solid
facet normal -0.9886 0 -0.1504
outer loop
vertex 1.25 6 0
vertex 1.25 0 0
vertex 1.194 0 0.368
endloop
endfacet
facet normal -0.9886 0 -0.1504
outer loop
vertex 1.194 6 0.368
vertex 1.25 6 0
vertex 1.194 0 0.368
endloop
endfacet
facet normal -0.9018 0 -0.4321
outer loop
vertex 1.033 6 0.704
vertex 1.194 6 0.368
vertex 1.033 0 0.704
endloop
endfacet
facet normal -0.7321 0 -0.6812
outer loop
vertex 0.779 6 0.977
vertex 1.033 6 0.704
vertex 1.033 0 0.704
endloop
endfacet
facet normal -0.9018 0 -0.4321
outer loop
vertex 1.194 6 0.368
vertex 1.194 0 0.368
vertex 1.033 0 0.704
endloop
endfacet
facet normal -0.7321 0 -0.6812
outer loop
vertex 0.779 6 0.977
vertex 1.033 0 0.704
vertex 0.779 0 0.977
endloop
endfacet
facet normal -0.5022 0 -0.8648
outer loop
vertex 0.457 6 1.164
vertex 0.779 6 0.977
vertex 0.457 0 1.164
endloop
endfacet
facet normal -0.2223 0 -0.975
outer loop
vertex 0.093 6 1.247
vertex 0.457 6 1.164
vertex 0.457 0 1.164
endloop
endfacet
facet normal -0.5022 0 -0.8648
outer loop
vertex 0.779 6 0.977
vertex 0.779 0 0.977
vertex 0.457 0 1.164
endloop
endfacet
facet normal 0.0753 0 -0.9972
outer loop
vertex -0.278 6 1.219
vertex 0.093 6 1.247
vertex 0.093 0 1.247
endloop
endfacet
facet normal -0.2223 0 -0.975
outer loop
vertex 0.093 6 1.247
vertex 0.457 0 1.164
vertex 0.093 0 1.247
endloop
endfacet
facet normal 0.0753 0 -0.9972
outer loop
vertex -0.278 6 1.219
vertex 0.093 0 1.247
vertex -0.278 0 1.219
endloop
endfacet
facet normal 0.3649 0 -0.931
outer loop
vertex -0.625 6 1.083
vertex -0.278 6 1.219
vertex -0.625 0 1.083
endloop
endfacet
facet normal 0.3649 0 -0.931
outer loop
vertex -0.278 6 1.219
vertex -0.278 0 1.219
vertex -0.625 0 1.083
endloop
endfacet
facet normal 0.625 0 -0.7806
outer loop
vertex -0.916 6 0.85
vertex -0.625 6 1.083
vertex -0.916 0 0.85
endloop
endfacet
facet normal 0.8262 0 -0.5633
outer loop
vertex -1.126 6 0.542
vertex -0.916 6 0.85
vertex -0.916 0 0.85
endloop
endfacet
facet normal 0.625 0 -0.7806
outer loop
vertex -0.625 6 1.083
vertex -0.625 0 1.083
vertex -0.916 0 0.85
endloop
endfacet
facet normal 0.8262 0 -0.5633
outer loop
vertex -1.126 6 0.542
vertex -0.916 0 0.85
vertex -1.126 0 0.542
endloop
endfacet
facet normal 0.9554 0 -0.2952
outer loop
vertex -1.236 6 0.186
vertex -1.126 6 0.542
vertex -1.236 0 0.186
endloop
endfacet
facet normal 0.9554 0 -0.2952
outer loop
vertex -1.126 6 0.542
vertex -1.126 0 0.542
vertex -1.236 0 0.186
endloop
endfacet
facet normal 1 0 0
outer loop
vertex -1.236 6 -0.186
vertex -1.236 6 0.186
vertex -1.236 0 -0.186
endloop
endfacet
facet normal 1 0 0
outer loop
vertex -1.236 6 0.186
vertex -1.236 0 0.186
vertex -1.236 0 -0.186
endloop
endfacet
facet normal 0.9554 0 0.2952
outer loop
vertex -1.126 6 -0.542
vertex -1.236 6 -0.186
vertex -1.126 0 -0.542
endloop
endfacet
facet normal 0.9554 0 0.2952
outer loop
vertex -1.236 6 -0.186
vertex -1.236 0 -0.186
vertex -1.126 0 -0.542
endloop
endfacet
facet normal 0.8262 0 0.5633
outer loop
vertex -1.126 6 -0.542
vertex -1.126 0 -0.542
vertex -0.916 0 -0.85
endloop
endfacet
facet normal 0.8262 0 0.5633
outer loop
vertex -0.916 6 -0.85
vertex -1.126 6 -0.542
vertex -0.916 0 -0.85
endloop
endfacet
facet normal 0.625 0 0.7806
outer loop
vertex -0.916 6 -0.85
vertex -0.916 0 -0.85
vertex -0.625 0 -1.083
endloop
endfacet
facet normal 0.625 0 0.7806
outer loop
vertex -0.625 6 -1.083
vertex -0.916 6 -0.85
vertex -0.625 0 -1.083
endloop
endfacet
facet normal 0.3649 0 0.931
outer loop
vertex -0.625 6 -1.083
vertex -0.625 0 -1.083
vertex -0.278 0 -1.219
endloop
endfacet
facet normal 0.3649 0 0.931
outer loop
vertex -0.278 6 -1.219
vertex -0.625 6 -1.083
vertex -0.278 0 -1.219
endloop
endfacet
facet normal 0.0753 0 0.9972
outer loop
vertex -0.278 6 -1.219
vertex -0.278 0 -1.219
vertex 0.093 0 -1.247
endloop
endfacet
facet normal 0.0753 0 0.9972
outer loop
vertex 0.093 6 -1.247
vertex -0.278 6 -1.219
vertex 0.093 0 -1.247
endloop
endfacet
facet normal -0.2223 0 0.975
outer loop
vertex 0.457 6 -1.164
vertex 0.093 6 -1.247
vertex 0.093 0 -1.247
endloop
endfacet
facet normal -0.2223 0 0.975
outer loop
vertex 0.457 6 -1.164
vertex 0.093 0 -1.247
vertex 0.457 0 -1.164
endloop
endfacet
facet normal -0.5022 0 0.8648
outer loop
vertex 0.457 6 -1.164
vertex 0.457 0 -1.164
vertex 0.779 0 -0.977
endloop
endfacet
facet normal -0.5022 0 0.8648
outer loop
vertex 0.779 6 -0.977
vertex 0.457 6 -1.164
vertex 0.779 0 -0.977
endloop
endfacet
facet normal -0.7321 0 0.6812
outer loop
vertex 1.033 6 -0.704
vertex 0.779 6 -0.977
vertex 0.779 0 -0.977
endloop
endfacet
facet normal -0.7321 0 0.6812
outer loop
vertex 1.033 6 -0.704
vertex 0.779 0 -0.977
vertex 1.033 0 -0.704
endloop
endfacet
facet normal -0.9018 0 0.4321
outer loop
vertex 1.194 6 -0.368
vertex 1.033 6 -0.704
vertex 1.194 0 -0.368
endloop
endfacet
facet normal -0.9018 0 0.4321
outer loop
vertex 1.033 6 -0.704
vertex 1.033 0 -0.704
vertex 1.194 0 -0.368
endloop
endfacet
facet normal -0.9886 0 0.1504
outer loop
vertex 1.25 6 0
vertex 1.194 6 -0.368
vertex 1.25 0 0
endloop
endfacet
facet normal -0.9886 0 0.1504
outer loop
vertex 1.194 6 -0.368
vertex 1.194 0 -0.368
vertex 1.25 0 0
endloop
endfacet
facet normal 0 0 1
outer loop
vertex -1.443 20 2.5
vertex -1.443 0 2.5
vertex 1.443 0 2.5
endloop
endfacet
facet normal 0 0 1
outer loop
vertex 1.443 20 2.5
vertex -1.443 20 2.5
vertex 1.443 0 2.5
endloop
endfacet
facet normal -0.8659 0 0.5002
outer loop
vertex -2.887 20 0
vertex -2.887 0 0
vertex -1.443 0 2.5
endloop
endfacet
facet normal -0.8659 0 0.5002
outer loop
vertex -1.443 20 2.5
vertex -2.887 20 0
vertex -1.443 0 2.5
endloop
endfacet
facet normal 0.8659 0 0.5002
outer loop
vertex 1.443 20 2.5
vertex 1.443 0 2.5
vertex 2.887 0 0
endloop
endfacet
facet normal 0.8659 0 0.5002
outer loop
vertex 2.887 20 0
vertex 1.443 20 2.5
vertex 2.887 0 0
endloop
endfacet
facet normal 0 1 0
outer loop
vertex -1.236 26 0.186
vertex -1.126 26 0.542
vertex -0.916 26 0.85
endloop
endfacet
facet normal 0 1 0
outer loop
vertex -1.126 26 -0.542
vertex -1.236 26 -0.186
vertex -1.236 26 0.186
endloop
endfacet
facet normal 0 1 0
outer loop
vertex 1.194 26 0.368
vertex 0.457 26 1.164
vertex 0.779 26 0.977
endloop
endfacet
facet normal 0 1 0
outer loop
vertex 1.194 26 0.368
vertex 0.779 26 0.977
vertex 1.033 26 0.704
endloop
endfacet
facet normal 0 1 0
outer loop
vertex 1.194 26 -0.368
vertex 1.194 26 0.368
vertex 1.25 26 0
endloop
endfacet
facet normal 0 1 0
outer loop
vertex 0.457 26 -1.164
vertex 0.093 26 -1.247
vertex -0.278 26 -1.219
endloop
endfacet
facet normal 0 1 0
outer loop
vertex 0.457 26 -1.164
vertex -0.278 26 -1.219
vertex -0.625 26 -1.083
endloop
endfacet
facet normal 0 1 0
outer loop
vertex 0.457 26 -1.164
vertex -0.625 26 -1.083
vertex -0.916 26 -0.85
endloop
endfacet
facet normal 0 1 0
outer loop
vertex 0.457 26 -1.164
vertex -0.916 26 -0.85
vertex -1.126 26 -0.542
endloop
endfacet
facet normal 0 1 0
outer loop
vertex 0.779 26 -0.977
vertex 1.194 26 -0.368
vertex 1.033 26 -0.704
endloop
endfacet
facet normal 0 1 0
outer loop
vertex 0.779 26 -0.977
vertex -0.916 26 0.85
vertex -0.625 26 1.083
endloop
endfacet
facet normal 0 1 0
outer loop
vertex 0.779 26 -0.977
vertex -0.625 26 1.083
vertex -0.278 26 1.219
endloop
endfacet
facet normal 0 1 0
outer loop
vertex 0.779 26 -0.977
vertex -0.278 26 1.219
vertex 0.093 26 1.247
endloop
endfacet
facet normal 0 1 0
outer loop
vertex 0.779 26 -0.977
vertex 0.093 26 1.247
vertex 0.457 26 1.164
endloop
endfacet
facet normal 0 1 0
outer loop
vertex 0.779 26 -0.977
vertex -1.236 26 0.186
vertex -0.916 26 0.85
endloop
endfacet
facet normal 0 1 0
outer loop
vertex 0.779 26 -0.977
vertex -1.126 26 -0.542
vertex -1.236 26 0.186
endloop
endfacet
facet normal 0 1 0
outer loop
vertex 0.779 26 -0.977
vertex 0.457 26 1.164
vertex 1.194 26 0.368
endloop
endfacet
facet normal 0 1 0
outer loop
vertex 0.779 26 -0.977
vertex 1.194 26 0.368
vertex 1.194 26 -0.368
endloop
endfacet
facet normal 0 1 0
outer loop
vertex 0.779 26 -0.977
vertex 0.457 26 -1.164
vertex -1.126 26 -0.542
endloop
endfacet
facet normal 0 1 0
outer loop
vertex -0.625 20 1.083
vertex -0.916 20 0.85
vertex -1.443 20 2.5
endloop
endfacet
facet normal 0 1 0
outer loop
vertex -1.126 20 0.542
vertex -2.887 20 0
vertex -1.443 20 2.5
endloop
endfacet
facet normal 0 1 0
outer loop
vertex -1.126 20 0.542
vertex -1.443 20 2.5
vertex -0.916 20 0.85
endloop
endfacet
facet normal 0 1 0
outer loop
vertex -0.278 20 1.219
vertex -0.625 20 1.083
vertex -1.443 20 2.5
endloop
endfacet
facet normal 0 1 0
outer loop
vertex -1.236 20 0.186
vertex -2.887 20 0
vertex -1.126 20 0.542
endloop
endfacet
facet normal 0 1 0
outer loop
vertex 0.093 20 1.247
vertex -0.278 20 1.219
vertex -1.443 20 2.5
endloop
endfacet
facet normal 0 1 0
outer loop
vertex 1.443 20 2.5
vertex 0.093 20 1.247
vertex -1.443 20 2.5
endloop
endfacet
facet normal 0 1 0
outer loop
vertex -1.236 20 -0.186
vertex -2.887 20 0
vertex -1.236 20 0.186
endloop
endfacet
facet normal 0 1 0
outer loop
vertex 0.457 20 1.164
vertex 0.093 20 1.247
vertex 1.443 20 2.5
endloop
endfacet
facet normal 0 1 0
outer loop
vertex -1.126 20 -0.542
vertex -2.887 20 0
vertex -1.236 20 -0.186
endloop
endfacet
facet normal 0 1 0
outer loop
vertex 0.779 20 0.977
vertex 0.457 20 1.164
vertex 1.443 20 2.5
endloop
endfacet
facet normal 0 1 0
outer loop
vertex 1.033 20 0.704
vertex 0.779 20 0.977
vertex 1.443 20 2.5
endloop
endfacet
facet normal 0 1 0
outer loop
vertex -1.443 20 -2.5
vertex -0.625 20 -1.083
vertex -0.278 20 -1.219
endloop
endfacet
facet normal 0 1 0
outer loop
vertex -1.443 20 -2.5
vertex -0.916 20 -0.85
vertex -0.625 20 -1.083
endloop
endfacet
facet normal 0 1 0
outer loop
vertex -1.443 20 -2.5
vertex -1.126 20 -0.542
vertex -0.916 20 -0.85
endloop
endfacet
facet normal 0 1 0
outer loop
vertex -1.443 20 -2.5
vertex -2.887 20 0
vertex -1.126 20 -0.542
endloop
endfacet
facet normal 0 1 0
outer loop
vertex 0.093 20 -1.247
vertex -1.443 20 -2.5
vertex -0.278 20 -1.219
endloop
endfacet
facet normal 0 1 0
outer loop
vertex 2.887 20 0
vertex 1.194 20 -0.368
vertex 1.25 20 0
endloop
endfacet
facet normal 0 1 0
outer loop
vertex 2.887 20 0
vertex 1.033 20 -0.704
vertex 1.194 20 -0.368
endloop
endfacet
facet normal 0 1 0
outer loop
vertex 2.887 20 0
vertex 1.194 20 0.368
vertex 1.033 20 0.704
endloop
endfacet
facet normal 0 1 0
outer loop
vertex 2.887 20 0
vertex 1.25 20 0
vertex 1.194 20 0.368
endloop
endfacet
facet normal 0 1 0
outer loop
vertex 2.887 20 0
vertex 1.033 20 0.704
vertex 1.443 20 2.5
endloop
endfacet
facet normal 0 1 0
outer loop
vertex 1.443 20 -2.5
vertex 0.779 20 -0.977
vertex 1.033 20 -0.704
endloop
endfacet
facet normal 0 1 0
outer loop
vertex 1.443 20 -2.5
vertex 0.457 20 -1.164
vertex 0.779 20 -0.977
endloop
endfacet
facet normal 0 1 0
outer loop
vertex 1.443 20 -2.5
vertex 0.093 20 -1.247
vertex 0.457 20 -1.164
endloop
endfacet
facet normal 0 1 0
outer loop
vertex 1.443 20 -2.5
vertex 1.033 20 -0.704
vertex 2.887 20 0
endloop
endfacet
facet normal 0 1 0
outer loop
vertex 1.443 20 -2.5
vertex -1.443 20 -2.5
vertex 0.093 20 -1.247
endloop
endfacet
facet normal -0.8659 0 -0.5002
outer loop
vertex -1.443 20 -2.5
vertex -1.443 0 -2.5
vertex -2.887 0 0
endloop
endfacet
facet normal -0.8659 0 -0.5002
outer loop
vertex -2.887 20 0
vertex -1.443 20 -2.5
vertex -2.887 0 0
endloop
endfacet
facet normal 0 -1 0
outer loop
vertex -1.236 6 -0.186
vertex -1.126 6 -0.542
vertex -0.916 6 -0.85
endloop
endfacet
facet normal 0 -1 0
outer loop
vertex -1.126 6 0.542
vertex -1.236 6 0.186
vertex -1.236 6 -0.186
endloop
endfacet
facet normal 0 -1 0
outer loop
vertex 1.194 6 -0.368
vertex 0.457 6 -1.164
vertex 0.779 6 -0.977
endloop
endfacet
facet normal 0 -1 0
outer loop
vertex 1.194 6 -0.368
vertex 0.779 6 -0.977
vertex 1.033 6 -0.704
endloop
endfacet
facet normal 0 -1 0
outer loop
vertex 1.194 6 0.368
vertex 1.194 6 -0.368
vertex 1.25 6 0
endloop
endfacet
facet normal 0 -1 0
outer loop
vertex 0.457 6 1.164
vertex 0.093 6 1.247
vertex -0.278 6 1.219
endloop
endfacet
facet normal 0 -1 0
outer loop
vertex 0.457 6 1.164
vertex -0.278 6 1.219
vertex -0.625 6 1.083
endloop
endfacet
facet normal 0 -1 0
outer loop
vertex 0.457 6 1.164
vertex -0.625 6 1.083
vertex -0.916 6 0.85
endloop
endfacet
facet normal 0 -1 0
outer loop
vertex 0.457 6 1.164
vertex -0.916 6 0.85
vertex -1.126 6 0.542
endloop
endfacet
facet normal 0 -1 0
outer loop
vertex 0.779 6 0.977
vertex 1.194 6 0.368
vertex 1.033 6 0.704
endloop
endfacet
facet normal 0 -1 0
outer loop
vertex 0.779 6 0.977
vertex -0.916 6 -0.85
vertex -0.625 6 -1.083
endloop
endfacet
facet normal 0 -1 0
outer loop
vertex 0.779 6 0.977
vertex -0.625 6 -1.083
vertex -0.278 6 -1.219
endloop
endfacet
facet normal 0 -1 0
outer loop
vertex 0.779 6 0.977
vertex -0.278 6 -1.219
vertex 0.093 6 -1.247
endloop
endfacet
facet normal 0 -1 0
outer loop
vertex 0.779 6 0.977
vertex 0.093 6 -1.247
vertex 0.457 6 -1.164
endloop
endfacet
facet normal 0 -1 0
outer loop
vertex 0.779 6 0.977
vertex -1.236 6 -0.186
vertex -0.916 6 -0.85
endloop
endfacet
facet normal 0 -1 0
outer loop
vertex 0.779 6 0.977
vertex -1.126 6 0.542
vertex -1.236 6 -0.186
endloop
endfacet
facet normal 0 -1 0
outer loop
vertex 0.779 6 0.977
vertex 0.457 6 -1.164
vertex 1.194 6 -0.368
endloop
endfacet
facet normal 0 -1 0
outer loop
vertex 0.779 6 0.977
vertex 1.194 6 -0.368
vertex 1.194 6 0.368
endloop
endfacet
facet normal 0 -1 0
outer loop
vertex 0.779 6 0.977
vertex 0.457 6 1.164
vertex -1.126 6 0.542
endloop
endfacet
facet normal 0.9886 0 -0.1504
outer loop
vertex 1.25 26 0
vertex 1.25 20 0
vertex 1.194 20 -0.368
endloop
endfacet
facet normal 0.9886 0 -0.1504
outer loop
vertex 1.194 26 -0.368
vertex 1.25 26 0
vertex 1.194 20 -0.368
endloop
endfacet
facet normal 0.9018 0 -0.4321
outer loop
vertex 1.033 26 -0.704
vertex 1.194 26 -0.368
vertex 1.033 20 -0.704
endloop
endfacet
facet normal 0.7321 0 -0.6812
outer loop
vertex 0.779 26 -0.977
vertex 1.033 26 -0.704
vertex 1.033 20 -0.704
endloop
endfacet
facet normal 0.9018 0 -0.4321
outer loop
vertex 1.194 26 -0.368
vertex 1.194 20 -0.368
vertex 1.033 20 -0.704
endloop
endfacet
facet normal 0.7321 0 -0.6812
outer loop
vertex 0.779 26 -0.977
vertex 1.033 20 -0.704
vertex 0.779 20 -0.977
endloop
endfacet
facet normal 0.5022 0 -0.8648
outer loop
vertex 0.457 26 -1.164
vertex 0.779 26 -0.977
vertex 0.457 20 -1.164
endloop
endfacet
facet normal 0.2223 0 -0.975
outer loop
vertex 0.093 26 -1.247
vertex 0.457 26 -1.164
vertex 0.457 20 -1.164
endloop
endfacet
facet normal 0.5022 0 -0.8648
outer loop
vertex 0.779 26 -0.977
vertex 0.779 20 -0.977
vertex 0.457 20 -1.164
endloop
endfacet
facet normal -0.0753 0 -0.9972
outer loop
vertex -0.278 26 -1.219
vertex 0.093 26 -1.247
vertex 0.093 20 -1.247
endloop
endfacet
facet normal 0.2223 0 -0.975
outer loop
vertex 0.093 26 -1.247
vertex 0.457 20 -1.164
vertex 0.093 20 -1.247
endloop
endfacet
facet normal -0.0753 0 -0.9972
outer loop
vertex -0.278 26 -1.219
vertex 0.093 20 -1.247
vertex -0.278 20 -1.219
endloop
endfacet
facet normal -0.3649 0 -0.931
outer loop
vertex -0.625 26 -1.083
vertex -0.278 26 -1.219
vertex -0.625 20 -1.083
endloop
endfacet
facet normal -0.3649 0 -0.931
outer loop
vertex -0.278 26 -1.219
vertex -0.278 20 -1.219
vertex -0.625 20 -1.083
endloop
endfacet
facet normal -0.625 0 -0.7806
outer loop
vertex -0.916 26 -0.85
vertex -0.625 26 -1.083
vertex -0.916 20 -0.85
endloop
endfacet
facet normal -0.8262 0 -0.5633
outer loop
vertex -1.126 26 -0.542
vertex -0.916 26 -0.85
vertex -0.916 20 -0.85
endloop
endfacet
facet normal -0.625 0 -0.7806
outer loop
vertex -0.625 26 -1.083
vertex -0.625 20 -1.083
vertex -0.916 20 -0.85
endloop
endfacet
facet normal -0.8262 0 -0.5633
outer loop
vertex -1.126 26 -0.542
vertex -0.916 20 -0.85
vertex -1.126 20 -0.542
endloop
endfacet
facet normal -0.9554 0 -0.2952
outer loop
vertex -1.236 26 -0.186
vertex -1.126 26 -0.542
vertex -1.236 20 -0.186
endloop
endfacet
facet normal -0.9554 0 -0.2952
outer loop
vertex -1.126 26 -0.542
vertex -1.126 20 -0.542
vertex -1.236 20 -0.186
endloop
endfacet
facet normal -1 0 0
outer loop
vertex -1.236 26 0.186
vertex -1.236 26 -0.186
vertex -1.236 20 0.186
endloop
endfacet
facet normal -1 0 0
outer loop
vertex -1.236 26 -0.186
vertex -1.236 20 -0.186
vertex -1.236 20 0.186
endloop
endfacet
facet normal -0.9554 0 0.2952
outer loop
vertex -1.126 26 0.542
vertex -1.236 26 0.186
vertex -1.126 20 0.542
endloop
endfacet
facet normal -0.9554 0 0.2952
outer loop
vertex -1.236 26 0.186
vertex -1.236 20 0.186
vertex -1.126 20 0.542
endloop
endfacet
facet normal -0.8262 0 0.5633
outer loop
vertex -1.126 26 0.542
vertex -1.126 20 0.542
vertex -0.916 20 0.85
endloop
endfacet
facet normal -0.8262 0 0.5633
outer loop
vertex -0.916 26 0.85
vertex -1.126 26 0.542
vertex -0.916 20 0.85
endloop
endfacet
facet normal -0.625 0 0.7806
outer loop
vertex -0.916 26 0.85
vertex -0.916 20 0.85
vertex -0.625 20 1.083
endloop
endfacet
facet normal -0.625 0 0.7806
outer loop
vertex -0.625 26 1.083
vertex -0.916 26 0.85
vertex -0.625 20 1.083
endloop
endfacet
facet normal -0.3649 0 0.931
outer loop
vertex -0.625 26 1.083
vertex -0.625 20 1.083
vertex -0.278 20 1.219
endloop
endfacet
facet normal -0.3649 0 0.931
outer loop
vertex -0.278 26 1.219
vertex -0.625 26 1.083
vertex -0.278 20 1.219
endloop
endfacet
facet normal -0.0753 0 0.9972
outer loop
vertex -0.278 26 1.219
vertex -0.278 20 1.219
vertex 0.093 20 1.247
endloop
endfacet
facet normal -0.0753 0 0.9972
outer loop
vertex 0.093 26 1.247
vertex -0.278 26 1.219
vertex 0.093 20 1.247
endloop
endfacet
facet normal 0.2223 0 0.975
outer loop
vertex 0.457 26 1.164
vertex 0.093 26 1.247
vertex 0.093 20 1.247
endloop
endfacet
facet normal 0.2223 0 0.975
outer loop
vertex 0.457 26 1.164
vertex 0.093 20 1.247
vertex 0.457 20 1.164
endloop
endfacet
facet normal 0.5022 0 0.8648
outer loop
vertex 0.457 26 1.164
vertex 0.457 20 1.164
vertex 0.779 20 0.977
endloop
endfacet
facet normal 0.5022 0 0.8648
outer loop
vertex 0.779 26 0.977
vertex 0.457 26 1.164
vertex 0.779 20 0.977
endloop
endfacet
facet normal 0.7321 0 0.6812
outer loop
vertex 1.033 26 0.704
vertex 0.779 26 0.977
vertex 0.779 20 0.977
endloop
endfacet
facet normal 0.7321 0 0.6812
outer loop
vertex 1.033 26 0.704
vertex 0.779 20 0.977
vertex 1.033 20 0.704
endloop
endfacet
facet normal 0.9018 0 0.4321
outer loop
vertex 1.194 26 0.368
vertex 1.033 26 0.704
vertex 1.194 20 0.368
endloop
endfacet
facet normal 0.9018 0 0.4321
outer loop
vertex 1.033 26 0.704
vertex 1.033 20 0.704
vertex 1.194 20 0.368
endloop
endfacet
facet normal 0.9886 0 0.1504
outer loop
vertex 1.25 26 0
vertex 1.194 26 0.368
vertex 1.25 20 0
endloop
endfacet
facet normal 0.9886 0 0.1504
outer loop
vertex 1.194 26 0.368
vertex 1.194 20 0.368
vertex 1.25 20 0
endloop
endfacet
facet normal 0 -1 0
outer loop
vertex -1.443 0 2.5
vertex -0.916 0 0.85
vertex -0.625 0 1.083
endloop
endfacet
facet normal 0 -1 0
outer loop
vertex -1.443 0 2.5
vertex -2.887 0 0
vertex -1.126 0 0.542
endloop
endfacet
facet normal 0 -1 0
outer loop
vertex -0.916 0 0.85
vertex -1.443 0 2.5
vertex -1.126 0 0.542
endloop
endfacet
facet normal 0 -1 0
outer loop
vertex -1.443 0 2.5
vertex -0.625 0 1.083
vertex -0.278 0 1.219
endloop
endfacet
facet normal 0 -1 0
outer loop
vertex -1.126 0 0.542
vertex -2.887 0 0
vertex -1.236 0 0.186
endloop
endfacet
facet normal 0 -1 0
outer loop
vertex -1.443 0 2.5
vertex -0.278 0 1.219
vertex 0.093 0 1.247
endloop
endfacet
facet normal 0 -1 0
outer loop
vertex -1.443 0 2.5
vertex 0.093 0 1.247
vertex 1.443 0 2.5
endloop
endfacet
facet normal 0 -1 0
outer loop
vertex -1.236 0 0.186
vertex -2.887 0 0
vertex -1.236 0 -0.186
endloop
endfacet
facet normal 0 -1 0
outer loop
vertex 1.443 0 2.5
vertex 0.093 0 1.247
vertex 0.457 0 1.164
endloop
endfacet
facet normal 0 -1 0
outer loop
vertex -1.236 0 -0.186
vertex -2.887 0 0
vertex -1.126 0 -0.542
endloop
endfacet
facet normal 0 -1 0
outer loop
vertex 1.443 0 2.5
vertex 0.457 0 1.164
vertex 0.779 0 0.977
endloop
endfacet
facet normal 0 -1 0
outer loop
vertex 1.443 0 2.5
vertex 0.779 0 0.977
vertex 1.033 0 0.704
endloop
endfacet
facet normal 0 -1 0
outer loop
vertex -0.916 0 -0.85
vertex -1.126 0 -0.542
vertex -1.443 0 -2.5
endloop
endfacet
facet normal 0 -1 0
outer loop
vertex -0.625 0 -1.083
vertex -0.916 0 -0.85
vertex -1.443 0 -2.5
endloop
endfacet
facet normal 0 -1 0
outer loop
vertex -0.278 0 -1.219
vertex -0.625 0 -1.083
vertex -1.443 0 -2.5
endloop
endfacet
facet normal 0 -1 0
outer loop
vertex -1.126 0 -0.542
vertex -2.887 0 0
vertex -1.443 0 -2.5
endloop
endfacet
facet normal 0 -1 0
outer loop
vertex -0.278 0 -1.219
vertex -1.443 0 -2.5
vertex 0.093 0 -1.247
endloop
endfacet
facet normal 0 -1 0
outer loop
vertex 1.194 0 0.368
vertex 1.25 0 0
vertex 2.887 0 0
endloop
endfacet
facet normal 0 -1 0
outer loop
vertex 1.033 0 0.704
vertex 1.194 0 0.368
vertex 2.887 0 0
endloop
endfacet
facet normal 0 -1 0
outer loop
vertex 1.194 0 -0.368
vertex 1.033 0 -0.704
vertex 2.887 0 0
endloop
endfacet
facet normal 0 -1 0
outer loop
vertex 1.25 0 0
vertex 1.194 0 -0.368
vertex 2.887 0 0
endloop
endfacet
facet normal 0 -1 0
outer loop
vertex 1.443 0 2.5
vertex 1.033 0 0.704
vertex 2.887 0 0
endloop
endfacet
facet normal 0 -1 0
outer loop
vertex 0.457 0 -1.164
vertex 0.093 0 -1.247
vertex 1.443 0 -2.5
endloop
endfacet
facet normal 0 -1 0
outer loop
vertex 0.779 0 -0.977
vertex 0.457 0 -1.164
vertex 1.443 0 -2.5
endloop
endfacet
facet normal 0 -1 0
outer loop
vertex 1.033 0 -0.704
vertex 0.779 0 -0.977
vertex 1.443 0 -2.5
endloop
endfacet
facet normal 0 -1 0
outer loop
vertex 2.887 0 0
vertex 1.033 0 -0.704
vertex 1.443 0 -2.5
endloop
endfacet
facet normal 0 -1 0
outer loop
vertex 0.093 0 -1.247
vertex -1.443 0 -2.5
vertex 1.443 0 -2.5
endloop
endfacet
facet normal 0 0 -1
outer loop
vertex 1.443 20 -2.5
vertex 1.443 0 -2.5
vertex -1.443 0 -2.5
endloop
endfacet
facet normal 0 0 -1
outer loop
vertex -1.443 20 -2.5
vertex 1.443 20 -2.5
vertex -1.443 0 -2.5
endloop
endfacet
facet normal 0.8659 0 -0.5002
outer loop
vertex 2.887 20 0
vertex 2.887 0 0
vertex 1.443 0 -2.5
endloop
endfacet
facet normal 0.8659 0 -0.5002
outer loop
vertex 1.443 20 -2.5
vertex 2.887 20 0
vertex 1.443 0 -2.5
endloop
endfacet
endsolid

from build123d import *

# Parameters (mm, degrees)
BOSS_EXTRUDE1_DEPTH = 20
SKETCH2_R           = 1.25
BOSS_EXTRUDE2_DEPTH = 6
SKETCH3_R           = 1.25
CUT_EXTRUDE1_DEPTH  = 6


with BuildPart() as part:
    # Sketch1 → Boss-Extrude1 (new body)
    with BuildSketch(Plane(origin=(0, 0, 0), x_dir=(1, 0, 0), z_dir=(0, 1, 0))):
        Polygon((-2.886751346, 0), (-1.443375673, -2.5), (1.443375673, -2.5), (2.886751346, 0), (1.443375673, 2.5), (-1.443375673, 2.5), align=None)
    extrude(amount=BOSS_EXTRUDE1_DEPTH)

    # Sketch2 → Boss-Extrude2 (add)
    with BuildSketch(Plane(origin=(0, 20, 0), x_dir=(1, 0, 0), z_dir=(0, 1, 0))):
        Circle(SKETCH2_R)
    extrude(amount=BOSS_EXTRUDE2_DEPTH)

    # Sketch3 → Cut-Extrude1 (cut)
    with BuildSketch(Plane.XZ):
        Circle(SKETCH3_R)
    extrude(amount=-CUT_EXTRUDE1_DEPTH, mode=Mode.SUBTRACT)


solid = part.part
